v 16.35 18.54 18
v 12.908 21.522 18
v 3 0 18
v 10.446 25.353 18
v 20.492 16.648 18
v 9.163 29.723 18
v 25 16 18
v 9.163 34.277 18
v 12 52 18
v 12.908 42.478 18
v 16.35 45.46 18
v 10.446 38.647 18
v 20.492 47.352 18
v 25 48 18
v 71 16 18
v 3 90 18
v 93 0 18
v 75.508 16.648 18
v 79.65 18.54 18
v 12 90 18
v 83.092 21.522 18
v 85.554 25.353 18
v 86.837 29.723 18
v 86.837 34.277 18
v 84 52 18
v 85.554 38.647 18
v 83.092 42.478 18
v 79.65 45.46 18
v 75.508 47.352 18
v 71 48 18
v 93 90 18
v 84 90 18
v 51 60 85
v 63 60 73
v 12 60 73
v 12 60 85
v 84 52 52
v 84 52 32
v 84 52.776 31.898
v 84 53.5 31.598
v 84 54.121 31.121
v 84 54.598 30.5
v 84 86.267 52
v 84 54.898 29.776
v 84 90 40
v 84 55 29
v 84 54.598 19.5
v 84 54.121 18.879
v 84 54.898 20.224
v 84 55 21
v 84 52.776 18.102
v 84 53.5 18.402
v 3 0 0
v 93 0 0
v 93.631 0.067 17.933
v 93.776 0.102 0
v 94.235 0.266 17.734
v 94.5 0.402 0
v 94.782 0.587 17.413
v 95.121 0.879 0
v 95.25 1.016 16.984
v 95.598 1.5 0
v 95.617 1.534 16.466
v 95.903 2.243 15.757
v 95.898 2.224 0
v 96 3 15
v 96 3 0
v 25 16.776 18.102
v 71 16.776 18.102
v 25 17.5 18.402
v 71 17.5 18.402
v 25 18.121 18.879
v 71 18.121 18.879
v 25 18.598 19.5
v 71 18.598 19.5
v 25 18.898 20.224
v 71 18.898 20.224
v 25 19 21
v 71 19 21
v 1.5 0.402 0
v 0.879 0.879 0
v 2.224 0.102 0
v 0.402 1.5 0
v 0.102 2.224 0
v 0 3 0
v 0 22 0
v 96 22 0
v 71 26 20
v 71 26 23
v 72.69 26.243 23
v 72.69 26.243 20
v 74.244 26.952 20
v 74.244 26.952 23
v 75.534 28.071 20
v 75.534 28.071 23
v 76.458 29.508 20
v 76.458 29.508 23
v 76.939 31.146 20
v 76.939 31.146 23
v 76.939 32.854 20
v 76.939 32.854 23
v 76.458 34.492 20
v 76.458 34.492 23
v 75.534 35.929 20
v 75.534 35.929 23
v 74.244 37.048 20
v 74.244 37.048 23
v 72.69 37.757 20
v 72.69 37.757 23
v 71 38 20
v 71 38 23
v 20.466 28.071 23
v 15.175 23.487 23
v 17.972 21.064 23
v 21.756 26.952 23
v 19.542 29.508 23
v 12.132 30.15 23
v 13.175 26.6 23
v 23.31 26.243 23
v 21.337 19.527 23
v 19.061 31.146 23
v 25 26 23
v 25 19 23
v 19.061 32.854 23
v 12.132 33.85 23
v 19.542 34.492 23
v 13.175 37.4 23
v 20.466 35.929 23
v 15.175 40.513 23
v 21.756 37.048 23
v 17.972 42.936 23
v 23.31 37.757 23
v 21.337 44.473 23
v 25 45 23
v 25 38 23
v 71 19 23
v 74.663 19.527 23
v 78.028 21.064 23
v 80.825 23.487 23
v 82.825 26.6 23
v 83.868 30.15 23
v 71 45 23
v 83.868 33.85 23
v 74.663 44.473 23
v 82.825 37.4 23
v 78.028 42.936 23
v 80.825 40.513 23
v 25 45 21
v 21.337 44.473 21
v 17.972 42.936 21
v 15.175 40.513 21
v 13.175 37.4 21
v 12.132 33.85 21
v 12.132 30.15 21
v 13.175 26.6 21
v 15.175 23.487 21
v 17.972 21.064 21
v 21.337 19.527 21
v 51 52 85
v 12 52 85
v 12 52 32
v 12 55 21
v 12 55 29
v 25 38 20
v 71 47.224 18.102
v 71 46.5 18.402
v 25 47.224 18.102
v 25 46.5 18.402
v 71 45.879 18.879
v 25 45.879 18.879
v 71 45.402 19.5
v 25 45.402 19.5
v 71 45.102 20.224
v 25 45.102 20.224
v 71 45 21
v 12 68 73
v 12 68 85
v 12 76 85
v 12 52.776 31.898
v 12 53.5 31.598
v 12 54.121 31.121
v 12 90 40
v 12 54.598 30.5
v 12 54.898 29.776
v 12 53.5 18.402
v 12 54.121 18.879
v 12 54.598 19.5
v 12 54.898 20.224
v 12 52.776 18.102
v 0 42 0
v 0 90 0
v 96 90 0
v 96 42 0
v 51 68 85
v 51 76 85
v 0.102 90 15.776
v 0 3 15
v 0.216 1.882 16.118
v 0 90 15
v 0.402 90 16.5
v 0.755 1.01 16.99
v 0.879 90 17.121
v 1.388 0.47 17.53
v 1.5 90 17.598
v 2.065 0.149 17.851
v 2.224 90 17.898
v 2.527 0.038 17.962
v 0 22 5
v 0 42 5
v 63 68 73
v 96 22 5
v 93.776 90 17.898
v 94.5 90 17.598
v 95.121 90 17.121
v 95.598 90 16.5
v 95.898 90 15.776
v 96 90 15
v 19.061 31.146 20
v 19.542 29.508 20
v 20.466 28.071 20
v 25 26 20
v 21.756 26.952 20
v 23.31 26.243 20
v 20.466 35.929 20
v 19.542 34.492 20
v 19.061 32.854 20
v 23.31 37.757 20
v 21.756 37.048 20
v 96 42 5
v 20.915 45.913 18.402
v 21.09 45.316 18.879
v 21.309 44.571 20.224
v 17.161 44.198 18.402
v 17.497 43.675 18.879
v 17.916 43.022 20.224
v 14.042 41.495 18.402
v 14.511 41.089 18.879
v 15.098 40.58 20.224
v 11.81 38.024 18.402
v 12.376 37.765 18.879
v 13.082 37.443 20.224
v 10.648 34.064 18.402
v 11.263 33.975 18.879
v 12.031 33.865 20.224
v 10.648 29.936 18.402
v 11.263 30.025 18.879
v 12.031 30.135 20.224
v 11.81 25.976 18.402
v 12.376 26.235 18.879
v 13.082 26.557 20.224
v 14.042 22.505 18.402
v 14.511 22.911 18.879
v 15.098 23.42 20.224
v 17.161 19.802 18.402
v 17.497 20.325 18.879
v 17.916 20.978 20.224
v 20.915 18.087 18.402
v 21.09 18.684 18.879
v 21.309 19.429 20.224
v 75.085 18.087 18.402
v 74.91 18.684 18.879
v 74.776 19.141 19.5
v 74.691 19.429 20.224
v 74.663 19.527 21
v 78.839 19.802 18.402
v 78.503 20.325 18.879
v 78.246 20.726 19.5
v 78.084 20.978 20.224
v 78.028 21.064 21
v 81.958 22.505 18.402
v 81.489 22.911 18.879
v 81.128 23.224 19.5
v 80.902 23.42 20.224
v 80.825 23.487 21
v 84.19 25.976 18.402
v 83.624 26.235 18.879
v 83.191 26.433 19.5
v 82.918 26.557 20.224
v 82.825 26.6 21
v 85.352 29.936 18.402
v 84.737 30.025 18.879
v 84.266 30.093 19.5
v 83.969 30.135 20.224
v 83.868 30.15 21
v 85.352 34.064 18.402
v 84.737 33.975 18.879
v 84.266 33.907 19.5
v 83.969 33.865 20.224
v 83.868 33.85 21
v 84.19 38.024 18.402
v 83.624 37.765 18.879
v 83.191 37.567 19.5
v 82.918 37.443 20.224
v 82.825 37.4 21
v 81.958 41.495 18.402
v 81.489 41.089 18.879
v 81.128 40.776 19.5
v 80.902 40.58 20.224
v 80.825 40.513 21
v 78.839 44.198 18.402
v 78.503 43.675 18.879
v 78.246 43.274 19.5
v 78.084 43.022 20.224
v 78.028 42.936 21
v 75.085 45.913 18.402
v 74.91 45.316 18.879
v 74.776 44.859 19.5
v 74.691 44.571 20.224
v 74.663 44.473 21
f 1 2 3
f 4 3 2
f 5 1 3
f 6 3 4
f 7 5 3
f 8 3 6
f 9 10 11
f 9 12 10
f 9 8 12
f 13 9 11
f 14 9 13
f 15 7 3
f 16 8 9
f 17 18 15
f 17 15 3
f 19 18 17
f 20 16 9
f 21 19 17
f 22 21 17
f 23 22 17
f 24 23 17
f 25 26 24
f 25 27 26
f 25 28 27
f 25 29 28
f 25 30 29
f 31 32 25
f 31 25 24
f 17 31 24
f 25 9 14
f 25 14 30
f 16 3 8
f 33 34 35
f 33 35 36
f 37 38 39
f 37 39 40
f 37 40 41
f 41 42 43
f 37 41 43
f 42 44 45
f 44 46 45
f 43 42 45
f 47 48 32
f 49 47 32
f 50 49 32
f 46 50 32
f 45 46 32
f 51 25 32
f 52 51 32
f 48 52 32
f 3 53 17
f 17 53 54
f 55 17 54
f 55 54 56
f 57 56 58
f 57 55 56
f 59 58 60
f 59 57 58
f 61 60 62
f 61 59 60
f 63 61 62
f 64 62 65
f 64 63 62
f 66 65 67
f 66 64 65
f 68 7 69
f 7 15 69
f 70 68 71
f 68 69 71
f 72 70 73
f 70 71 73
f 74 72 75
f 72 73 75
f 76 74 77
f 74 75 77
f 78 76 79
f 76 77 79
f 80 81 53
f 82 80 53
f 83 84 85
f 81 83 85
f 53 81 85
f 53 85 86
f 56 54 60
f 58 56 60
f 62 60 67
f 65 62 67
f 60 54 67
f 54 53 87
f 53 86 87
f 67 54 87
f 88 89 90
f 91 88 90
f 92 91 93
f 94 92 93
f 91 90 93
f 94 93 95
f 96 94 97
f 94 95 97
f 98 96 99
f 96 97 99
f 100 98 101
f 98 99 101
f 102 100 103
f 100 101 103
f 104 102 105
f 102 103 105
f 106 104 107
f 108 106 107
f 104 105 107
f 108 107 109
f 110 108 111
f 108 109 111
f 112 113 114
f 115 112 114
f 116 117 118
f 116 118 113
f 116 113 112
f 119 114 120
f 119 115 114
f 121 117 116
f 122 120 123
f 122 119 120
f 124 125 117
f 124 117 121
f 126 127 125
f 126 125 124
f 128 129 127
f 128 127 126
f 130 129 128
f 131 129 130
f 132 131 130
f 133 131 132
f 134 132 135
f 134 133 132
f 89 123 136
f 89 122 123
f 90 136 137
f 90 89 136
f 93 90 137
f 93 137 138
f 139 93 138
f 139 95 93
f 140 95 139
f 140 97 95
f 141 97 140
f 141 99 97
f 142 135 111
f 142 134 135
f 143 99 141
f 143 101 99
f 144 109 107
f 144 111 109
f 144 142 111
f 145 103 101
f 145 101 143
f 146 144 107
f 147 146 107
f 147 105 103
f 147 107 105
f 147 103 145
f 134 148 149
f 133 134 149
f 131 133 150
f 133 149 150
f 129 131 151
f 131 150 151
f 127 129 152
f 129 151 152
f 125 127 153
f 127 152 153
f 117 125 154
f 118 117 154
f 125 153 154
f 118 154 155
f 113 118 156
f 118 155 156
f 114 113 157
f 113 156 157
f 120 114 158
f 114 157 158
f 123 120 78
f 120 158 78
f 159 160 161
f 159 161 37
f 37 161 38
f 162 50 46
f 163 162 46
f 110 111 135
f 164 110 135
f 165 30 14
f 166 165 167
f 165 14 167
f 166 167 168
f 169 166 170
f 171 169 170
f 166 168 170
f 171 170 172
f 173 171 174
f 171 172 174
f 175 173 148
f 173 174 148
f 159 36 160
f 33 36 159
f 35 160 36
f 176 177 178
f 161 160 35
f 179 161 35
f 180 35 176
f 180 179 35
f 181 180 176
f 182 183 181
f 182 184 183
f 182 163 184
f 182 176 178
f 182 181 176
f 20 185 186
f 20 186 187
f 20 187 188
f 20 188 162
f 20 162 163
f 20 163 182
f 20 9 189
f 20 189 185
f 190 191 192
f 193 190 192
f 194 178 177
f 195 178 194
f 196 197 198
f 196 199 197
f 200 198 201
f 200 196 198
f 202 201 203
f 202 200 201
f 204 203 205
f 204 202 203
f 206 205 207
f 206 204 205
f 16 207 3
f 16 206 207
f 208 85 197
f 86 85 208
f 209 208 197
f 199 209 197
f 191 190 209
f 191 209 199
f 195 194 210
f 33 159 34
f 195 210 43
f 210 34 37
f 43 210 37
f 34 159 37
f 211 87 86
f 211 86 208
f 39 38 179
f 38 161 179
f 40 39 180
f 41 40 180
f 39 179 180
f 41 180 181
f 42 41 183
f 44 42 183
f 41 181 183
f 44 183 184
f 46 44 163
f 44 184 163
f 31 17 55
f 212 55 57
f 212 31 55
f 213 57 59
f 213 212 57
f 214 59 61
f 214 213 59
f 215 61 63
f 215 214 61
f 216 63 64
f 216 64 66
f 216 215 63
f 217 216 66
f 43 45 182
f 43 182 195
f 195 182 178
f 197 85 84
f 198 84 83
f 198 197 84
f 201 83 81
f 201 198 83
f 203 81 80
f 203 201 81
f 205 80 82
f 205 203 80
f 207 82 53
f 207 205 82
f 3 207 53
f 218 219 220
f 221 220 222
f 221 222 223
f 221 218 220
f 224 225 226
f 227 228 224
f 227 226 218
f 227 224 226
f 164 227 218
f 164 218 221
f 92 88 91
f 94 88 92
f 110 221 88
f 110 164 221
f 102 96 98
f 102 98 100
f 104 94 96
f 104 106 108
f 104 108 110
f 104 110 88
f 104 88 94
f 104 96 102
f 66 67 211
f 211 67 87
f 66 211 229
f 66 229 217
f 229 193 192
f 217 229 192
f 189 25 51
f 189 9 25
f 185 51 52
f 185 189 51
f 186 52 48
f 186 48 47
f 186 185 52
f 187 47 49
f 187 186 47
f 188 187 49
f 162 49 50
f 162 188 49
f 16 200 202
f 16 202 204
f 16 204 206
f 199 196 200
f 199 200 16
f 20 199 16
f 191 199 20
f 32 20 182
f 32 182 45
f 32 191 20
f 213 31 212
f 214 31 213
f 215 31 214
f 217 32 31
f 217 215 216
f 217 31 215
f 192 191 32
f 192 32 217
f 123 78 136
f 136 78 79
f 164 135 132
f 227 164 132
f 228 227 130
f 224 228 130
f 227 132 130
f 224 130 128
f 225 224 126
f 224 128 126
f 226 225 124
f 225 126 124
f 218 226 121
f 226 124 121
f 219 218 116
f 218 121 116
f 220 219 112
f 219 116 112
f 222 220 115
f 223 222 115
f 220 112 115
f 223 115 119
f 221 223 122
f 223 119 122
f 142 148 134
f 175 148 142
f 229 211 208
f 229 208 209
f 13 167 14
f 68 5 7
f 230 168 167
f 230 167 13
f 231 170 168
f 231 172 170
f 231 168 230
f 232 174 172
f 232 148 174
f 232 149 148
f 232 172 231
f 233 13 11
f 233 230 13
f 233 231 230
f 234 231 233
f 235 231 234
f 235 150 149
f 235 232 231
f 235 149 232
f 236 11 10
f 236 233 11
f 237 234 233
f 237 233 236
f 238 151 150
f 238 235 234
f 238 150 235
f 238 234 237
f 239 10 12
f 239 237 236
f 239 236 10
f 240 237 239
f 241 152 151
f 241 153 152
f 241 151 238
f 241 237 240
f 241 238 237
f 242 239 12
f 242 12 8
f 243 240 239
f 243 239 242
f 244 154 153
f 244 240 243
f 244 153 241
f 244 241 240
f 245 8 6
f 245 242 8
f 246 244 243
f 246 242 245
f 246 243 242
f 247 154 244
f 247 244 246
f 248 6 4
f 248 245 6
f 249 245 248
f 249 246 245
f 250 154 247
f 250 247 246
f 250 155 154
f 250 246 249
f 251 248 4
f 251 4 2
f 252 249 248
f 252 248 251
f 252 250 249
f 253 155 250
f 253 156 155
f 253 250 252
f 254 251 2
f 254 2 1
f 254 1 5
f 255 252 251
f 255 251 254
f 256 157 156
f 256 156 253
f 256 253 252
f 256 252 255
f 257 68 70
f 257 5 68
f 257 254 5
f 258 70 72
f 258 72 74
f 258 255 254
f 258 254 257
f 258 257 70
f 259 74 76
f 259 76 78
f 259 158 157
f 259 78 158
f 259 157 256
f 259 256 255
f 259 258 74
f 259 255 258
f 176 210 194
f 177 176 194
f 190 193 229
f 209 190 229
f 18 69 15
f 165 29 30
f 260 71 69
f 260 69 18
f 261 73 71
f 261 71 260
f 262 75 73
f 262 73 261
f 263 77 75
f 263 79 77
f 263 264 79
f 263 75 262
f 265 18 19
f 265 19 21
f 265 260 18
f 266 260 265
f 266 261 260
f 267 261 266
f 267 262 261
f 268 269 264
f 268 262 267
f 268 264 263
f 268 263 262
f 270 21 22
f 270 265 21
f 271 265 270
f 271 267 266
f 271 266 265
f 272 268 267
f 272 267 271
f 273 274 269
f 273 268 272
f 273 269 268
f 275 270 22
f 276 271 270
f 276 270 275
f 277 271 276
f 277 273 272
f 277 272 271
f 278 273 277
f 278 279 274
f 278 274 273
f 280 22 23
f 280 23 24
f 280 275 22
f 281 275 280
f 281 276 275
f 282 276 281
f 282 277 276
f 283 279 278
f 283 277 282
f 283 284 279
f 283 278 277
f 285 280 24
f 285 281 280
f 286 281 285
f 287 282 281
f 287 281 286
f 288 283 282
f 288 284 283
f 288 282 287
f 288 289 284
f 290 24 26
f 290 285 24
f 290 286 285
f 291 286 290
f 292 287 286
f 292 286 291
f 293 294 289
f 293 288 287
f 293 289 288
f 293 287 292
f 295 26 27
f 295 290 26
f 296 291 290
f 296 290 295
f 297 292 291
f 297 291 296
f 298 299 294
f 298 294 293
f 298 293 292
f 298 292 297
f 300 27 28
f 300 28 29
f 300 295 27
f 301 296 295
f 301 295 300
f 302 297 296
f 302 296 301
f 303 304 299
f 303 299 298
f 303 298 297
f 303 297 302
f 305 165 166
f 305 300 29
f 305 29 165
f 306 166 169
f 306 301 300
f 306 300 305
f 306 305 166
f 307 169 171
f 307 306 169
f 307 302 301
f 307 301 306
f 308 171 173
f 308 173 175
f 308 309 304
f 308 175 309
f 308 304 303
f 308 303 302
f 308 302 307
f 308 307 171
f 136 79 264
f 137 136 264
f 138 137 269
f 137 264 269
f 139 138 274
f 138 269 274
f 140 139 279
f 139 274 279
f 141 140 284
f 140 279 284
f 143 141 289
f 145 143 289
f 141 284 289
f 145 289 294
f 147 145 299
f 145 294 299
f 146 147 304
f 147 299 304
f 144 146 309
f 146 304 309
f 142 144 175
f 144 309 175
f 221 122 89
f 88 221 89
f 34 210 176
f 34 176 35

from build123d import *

# Parameters (mm, degrees)
F0_W      = 96
F0_H      = 90
F1_DEPTH  = 18
F2_W      = 72
F2_H      = 38
F4_DEPTH  = 67
F6_DEPTH  = 38
F7_W      = 8
F7_H      = 12
F8_DEPTH  = 51.001
F10_DEPTH = 72.001
F11_W     = 20
F11_H     = 5
F12_DEPTH = 96
F13_W     = 46
F13_H     = 26
F14_DEPTH = 5
F16_DEPTH = 3
F17_W     = 3
F17_H     = 14
F18_DEPTH = 72
F19_R     = 2.99999


# Not quite as in the source:
# - a fillet or chamfer is up to 0.001 mm smaller than in the source, because OpenCascade refuses the exact size


with BuildPart() as f1:
    # F0 (on Top) → F1 (new body)
    with BuildSketch(Plane.XY):
        with Locations((48, 45)):
            Rectangle(F0_W, F0_H)
    extrude(amount=F1_DEPTH)

    # F2 (on face) → F4 (join, through all)
    with BuildSketch(Plane.XY.offset(18)):
        with Locations((48, 71)):
            Rectangle(F2_W, F2_H)
    extrude(amount=F4_DEPTH)

    # F5 (on face) → F6 (cut, through all)
    with BuildSketch(Plane.XZ.offset(-52)):
        Polygon((84, 52), (84, 85), (51, 85), align=None)
    extrude(amount=-F6_DEPTH, mode=Mode.SUBTRACT)

    # F7 (on face) → F8 (cut, through all)
    with BuildSketch(Plane(origin=(12, 0, 0), x_dir=(0, -1, 0), z_dir=(-1, 0, 0))):
        with Locations((-64, 79)):
            Rectangle(F7_W, F7_H)
    extrude(amount=-F8_DEPTH, mode=Mode.SUBTRACT)

    # F9 (on face) → F10 (cut, through all)
    with BuildSketch(Plane(origin=(12, 0, 0), x_dir=(0, -1, 0), z_dir=(-1, 0, 0))):
        Polygon((-90, 40), (-76, 85), (-90, 85), align=None)
    extrude(amount=-F10_DEPTH, mode=Mode.SUBTRACT)

    # F11 (on face) → F12 (cut, through all)
    with BuildSketch(Plane.YZ.offset(96)):
        with Locations((32, 2.5)):
            Rectangle(F11_W, F11_H)
    extrude(amount=-F12_DEPTH, mode=Mode.SUBTRACT)

    # F13 (on face) → F14 (join)
    with BuildSketch(Plane.XY.offset(18)):
        with Locations((48, 31.9999999999)):
            Rectangle(F13_W, F13_H)
        with BuildLine():
            Line((25, 18.9999999999), (25, 44.9999999999))
            ThreePointArc((25, 44.9999999999), (12, 31.9999999999), (25, 18.9999999999))
        make_face()
        with BuildLine():
            ThreePointArc((71, 18.9999999999), (84, 31.9999999999), (71, 44.9999999999))
            Line((71, 44.9999999999), (71, 18.9999999999))
        make_face()
    extrude(amount=F14_DEPTH)

    # F15 (on face) → F16 (cut)
    with BuildSketch(Plane.XY.offset(23)):
        with BuildLine():
            ThreePointArc((71, 25.9999999999), (77, 31.9999999999), (71, 37.9999999999))
            Line((71, 37.9999999999), (71, 25.9999999999))
        make_face()
        Polygon((25, 37.9999999999), (25, 31.9999999999), (25, 25.9999999999), (71, 25.9999999999), (71, 37.9999999999), align=None)
        with BuildLine():
            Line((25, 25.9999999999), (25, 31.9999999999))
            Line((25, 31.9999999999), (25, 37.9999999999))
            ThreePointArc((25, 37.9999999999), (19, 31.9999999999), (25, 25.9999999999))
        make_face()
    extrude(amount=-F16_DEPTH, mode=Mode.SUBTRACT)

    # F17 (on face) → F18 (cut, through all)
    with BuildSketch(Plane.YZ.offset(84)):
        with Locations((53.5, 25)):
            Rectangle(F17_W, F17_H)
    extrude(amount=-F18_DEPTH, mode=Mode.SUBTRACT)

    # F19 (radius 3 in the source; OpenCascade refuses exactly that, so slightly less here)
    f19_edges = [f1.edges().sort_by_distance(p)[0] for p in [
        (48, 55, 18),
        (48, 19, 18),
        (48, 55, 32),
        (96, 45, 18),
        (0, 45, 18),
        (96, 0, 9),
        (0, 0, 9),
    ]]
    fillet(f19_edges, radius=F19_R)


solid = f1.part
